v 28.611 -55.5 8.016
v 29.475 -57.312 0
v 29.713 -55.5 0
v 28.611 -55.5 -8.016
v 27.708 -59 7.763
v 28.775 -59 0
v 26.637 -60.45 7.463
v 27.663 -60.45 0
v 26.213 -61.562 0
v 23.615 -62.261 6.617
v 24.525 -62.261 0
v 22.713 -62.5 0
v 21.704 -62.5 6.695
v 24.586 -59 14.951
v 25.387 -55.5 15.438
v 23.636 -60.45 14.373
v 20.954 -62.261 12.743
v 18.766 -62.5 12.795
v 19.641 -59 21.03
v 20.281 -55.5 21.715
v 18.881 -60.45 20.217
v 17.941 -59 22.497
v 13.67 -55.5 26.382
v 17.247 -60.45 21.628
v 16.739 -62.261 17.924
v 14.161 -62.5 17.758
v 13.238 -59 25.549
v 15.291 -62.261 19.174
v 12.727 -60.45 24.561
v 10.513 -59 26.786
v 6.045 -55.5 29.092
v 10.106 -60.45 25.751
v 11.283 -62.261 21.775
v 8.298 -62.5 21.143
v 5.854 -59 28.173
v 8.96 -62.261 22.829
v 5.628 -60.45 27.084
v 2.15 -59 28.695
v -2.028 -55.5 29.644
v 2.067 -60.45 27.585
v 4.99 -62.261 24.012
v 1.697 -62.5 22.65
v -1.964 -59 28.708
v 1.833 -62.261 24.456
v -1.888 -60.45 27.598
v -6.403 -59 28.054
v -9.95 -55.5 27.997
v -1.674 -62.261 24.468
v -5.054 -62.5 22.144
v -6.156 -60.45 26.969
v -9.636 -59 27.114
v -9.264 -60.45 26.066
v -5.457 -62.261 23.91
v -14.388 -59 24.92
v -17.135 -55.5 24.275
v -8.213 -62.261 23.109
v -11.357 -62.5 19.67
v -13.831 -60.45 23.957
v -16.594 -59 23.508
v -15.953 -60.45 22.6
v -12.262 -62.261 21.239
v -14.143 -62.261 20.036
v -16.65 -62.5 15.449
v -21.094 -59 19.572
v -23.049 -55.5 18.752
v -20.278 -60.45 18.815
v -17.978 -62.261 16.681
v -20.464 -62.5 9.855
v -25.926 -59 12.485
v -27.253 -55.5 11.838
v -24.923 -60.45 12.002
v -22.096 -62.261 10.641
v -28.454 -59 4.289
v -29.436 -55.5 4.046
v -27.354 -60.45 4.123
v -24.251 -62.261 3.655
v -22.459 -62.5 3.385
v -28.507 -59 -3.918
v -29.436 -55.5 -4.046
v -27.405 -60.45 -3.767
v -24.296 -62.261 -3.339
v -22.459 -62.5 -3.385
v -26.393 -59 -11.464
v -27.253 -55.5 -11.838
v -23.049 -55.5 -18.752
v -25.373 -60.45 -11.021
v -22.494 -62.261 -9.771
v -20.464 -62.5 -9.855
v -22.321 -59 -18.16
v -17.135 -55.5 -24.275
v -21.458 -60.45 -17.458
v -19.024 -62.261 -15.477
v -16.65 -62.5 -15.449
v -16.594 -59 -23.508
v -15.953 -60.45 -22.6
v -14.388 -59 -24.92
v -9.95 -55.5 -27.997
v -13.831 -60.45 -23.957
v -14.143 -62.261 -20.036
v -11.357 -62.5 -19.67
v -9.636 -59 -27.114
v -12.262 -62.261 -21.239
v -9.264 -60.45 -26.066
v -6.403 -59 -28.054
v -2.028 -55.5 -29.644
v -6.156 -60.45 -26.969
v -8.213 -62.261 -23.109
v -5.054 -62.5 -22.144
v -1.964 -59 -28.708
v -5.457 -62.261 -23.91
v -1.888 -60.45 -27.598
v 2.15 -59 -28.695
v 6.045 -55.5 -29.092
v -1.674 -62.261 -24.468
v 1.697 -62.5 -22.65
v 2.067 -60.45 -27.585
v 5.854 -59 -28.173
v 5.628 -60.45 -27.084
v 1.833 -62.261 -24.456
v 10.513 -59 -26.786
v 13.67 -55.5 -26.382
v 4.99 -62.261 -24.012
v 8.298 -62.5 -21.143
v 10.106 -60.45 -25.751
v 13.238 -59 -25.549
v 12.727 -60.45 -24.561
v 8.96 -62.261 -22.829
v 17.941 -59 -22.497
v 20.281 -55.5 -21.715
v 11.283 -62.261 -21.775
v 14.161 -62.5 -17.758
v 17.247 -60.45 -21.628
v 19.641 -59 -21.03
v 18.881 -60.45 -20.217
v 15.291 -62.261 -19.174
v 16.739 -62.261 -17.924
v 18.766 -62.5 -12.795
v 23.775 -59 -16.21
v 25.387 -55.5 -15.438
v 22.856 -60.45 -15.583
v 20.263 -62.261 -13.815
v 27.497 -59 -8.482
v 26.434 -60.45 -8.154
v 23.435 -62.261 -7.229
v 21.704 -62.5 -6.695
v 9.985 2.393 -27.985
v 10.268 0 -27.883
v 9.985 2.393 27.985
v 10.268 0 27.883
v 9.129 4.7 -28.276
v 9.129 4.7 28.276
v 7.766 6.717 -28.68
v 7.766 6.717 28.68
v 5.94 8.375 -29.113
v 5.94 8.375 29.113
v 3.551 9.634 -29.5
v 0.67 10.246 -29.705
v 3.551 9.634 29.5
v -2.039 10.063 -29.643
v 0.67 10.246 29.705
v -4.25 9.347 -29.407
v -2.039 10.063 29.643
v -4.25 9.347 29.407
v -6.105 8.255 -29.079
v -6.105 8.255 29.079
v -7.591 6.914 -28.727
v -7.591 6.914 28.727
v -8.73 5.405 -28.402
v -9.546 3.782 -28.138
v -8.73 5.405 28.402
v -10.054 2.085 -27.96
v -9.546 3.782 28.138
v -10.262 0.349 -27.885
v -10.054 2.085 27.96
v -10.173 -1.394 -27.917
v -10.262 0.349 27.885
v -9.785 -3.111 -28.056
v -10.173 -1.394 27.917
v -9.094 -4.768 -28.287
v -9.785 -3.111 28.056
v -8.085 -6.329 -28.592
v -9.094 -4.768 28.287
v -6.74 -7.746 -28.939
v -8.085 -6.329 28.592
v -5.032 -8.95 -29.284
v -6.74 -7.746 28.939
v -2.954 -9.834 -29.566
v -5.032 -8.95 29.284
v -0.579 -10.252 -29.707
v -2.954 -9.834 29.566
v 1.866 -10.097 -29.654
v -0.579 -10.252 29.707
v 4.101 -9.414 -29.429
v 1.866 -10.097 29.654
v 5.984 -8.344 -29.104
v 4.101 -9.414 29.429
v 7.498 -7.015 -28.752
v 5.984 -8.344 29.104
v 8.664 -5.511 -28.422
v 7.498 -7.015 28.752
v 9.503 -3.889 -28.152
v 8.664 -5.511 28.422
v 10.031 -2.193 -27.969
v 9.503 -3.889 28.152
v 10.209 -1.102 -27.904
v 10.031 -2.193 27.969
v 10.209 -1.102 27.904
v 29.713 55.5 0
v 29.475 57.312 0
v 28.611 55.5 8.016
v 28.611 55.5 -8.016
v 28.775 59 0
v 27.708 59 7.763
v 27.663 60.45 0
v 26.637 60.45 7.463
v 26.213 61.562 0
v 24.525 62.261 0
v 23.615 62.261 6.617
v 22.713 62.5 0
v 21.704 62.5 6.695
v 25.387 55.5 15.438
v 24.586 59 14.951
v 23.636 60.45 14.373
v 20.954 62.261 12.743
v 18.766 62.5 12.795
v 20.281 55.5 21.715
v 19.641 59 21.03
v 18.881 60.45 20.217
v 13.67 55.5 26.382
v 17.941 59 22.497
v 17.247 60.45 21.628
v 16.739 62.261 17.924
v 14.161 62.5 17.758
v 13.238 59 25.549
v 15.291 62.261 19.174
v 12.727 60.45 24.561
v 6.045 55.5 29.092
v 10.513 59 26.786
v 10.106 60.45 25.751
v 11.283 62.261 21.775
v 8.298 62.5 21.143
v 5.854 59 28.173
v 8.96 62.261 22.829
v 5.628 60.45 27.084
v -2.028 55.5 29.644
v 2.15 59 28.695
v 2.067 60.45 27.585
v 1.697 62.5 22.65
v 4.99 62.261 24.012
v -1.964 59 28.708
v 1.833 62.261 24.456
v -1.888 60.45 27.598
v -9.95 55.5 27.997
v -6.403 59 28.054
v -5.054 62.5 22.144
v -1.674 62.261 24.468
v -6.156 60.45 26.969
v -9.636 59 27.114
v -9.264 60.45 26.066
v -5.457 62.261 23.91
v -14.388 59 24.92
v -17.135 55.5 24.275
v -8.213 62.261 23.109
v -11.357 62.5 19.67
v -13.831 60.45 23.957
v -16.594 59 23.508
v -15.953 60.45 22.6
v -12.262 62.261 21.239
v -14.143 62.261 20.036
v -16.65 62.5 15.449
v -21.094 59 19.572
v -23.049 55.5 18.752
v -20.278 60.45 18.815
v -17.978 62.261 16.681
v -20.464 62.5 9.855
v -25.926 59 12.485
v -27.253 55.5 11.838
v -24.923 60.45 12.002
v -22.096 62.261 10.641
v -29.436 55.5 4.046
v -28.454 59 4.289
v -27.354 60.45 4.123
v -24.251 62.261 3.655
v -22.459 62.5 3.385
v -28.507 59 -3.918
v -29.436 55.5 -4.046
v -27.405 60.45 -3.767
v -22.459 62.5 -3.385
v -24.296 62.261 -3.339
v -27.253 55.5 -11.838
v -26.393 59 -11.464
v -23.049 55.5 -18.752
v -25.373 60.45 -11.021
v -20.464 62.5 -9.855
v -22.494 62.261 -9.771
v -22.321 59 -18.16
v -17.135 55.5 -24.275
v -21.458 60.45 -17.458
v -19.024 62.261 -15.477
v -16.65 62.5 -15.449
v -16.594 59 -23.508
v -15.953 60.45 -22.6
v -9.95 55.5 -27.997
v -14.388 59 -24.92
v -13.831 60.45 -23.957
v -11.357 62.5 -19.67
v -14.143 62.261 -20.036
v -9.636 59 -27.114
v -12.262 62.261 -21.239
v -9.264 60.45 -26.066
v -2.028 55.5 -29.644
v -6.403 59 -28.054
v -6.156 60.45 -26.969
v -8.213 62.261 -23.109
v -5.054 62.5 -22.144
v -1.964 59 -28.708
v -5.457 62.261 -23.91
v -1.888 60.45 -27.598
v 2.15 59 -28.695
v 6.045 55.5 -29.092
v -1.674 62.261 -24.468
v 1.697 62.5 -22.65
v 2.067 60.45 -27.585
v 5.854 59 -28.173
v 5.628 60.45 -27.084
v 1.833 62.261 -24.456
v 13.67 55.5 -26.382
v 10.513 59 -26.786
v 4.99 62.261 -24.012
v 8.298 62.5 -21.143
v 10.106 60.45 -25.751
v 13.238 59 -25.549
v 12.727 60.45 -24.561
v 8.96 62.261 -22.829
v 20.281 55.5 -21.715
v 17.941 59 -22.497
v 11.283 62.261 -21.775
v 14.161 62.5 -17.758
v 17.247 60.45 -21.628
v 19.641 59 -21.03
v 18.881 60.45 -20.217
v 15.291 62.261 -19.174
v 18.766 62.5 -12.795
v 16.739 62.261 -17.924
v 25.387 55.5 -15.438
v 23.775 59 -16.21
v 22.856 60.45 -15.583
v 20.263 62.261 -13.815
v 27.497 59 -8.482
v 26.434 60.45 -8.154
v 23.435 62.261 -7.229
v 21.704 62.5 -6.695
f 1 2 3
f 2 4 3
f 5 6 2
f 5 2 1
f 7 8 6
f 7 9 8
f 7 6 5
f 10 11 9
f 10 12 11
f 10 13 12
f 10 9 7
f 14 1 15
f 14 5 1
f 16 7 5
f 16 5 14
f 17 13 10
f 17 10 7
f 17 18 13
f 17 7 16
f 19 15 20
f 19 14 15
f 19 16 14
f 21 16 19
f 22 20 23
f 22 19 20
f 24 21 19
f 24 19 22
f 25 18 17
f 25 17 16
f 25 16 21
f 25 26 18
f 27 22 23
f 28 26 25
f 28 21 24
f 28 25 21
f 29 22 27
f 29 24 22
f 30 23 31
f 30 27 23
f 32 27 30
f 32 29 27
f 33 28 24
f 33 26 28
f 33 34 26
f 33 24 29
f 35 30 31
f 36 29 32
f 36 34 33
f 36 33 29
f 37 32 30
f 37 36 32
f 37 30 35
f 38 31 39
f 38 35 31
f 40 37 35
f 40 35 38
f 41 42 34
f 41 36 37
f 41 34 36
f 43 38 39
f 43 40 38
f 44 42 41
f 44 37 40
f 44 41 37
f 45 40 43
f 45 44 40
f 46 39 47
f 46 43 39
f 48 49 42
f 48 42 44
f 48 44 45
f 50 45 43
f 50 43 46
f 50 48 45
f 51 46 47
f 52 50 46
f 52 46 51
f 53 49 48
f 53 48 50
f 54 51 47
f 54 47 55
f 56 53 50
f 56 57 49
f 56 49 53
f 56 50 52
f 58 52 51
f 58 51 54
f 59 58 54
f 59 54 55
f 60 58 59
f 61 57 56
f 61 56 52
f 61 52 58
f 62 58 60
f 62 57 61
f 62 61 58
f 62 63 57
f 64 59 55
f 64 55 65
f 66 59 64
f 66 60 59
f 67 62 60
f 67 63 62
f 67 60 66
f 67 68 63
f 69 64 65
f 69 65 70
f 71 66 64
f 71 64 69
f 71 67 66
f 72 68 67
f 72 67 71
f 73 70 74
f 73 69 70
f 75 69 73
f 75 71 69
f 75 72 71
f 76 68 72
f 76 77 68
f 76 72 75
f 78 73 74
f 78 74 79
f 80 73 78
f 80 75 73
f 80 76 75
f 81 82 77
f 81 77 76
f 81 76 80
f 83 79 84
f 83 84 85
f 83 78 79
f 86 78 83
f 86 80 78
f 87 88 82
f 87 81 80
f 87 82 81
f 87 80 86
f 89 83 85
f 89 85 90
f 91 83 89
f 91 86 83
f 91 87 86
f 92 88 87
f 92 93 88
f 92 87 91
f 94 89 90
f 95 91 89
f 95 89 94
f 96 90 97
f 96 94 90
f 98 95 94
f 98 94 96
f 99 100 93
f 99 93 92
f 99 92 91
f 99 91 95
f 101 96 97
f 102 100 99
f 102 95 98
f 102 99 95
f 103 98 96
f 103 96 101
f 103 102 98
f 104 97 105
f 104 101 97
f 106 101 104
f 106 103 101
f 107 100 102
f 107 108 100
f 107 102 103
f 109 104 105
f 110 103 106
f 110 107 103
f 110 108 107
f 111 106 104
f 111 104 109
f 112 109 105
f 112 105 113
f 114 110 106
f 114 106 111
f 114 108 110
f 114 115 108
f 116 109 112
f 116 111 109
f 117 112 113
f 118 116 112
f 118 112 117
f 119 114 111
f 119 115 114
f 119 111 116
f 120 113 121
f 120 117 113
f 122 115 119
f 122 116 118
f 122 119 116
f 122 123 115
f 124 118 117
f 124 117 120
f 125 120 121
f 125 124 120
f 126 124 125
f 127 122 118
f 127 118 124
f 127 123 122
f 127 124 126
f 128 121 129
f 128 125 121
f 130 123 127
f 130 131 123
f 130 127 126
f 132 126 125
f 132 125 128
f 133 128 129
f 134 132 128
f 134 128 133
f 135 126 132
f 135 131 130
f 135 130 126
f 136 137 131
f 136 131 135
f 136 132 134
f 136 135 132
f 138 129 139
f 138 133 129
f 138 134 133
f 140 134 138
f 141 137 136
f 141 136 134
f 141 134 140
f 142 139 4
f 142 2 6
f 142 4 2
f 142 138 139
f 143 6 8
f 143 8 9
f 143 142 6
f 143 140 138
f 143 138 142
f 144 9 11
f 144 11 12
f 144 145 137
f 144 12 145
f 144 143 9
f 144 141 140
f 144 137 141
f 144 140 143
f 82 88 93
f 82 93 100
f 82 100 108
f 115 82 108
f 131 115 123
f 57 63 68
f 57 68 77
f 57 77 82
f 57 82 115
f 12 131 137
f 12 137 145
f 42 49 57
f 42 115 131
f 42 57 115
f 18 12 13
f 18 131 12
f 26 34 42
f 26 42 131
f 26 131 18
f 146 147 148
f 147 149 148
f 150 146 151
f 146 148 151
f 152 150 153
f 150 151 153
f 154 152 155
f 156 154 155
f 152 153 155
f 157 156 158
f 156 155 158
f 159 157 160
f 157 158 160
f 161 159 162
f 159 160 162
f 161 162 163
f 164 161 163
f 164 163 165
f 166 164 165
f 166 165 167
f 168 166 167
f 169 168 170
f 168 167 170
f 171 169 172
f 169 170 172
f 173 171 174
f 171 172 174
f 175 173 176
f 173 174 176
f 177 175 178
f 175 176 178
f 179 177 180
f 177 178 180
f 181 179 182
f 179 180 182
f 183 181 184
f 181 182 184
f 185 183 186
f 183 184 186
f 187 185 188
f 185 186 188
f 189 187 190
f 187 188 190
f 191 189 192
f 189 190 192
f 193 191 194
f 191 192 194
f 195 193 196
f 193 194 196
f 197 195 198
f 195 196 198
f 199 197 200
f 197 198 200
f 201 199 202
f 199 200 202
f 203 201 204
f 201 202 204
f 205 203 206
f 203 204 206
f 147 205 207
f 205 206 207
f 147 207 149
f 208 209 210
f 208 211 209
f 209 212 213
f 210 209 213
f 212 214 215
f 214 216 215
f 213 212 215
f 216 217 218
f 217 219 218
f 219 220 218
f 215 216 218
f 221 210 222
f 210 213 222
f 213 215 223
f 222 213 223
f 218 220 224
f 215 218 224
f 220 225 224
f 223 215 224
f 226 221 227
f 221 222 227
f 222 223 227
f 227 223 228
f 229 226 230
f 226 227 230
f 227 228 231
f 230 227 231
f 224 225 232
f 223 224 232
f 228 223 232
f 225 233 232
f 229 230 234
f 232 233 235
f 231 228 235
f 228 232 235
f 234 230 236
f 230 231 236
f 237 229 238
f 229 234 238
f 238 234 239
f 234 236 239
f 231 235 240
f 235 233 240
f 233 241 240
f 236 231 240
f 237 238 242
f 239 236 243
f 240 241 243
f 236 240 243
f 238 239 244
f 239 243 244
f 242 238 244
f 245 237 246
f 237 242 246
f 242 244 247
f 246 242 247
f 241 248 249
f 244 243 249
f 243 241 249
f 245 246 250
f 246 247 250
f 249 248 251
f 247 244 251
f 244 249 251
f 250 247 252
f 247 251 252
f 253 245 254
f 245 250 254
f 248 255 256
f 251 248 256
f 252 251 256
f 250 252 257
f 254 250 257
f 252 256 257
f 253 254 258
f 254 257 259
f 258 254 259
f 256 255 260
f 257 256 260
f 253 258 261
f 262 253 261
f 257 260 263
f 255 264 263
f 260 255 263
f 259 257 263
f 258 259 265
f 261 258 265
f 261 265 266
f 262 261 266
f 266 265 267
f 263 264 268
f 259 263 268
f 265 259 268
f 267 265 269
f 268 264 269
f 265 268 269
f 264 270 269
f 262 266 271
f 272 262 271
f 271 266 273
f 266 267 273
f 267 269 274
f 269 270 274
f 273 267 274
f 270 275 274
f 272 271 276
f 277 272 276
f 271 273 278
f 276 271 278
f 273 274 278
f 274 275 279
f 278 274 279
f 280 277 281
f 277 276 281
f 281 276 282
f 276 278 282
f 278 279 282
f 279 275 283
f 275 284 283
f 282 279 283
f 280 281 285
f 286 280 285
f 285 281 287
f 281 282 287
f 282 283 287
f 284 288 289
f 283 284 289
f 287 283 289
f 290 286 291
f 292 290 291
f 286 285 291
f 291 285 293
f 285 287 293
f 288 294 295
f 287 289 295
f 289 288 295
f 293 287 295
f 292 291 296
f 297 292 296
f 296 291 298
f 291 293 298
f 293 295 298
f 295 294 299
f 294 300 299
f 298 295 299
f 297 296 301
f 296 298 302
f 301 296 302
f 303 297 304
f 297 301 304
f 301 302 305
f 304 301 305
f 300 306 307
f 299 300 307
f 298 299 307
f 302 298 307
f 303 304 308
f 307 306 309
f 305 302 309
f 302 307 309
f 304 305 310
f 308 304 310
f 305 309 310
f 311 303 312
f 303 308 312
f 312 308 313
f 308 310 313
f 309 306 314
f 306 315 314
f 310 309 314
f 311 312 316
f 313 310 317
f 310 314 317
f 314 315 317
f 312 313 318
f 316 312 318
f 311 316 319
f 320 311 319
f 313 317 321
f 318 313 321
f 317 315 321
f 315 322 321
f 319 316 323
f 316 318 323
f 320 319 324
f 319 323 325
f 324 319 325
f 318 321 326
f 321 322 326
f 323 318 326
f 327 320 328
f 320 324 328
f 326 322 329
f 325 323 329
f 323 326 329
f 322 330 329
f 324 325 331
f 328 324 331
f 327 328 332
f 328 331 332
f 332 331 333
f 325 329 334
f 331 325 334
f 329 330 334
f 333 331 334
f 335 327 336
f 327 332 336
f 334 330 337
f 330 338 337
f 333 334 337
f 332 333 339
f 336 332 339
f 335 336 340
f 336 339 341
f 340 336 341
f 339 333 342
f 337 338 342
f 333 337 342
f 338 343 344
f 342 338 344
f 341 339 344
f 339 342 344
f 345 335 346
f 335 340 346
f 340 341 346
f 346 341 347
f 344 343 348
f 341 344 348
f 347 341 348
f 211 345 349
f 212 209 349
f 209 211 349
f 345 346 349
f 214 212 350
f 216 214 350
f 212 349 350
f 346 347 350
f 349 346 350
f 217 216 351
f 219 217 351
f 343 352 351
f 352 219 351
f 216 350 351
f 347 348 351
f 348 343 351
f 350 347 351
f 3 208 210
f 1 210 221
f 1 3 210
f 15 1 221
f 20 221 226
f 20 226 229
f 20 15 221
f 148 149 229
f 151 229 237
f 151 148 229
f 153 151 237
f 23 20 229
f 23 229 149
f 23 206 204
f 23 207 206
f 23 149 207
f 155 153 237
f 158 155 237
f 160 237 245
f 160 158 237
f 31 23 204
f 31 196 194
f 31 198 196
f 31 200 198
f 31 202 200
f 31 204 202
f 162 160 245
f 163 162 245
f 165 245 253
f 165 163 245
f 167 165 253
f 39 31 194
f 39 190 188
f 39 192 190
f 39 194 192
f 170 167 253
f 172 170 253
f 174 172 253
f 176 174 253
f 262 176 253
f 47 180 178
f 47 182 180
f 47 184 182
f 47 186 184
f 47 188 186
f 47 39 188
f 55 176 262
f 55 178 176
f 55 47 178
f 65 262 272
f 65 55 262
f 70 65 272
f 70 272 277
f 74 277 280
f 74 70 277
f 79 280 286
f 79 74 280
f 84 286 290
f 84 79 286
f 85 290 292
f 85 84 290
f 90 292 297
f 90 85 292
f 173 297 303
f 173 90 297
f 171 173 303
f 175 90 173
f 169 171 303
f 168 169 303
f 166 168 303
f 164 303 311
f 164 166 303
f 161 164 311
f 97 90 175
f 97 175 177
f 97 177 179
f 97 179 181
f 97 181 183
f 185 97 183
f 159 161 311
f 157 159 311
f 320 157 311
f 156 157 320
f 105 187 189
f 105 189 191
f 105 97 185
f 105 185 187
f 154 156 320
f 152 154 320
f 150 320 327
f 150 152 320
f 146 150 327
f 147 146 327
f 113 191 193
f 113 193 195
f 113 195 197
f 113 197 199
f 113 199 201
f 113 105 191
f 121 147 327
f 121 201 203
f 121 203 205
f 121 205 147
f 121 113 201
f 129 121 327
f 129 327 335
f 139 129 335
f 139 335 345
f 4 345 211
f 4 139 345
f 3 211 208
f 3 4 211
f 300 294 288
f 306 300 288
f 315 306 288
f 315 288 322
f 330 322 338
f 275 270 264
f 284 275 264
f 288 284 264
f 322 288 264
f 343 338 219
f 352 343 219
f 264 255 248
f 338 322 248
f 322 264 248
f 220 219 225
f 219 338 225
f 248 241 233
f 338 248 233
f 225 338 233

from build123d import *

# Parameters (mm, degrees)
F0_R     = 29.713042
F1_DEPTH = 62.5
F2_R     = 10.267926
F3_DEPTH = 40
F4_R     = 7


with BuildPart() as f1:
    # F0 (on Front) → F1 (new body, symmetric)
    with BuildSketch(Plane.XZ):
        Circle(F0_R)
    extrude(amount=F1_DEPTH, both=True)

    # F2 (on Top) → F3 (cut, symmetric)
    with BuildSketch(Plane.XY):
        Circle(F2_R)
    extrude(amount=F3_DEPTH, both=True, mode=Mode.SUBTRACT)

    # F4
    f4_edges = [f1.edges().sort_by_distance(p)[0] for p in [
        (-29.713042, -62.5, 0),
        (-29.713042, 62.5, 0),
    ]]
    fillet(f4_edges, radius=F4_R)


solid = f1.part
